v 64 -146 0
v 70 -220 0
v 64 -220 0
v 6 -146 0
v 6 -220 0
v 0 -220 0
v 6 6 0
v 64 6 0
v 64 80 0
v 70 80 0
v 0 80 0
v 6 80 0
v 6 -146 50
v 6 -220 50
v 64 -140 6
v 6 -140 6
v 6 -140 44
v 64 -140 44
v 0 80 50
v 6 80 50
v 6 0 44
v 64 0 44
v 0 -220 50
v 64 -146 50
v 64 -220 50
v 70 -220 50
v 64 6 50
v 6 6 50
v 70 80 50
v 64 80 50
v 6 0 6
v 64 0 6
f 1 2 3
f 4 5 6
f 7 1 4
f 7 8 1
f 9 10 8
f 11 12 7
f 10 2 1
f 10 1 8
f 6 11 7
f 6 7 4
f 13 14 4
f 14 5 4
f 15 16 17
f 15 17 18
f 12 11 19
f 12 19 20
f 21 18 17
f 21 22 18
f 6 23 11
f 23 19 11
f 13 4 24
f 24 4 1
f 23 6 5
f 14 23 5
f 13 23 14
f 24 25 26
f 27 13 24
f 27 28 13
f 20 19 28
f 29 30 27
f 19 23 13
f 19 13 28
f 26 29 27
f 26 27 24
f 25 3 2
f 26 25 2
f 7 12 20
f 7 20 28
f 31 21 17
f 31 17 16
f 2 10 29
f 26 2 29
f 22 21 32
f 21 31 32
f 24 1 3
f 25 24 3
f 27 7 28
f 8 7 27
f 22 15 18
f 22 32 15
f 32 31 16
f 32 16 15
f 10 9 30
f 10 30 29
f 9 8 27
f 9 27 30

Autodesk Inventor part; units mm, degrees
ref_plane "YZ Plane" through (0, 0, 0) normal (1, 0, 0) x (0, 1, 0)
ref_plane "XZ Plane" through (0, 0, 0) normal (0, 1, 0) x (-1, 0, 0)
ref_plane "XY Plane" through (0, 0, 0) normal (0, 0, 1) x (1, 0, 0)
sketch "Sketch1" plane through (0, 0, 0) normal (0, 0, 1) x (1, 0, 0)
  line L0 (0, 80) -> (0, 0)
  line L1 (0, 0) -> (70, 0)
  line L2 (70, 0) -> (70, 80)
  line L3 (6, 80) -> (6, 6)
  line L4 (6, 6) -> (64, 6)
  line L5 (64, 6) -> (64, 80)
  line L6 (0, 80) -> (6, 80)
  line L7 (64, 80) -> (70, 80)
  line L8 (0, -70) -> (70, -70)
  line L9 (0, -220) -> (0, -140)
  line L10 (0, -140) -> (70, -140)
  line L11 (70, -140) -> (70, -220)
  line L12 (6, -220) -> (6, -146)
  line L13 (6, -146) -> (64, -146)
  line L14 (64, -146) -> (64, -220)
  line L15 (0, -220) -> (6, -220)
  line L16 (64, -220) -> (70, -220)
  dimension "d0" = 70
  dimension "d1" = 80
  dimension "d2" = 80
  dimension "d3" = 6
  dimension "d10" = 70
extrude "Extrusion1" add sketch "Sketch1" along normal blind 50
sketch "Sketch2" plane through (0, 0, 0) normal (0, -1, 0) x (1, 0, 0)
  line L0 (6, 0) -> (0, 0) projected
  line L1 (0, 50) -> (70, 50) projected
  line L2 (0, 0) -> (70, 0)
  line L3 (70, 0) -> (70, 50)
  line L4 (70, 50) -> (0, 50)
  line L5 (0, 50) -> (0, 0)
  line L6 (6, 6) -> (64, 6)
  line L7 (64, 6) -> (64, 44)
  line L8 (64, 44) -> (6, 44)
  line L9 (6, 44) -> (6, 6)
  dimension "d7" = 6
extrude "Extrusion2" add sketch "Sketch2" along normal blind 140
properties part number "armj2"
